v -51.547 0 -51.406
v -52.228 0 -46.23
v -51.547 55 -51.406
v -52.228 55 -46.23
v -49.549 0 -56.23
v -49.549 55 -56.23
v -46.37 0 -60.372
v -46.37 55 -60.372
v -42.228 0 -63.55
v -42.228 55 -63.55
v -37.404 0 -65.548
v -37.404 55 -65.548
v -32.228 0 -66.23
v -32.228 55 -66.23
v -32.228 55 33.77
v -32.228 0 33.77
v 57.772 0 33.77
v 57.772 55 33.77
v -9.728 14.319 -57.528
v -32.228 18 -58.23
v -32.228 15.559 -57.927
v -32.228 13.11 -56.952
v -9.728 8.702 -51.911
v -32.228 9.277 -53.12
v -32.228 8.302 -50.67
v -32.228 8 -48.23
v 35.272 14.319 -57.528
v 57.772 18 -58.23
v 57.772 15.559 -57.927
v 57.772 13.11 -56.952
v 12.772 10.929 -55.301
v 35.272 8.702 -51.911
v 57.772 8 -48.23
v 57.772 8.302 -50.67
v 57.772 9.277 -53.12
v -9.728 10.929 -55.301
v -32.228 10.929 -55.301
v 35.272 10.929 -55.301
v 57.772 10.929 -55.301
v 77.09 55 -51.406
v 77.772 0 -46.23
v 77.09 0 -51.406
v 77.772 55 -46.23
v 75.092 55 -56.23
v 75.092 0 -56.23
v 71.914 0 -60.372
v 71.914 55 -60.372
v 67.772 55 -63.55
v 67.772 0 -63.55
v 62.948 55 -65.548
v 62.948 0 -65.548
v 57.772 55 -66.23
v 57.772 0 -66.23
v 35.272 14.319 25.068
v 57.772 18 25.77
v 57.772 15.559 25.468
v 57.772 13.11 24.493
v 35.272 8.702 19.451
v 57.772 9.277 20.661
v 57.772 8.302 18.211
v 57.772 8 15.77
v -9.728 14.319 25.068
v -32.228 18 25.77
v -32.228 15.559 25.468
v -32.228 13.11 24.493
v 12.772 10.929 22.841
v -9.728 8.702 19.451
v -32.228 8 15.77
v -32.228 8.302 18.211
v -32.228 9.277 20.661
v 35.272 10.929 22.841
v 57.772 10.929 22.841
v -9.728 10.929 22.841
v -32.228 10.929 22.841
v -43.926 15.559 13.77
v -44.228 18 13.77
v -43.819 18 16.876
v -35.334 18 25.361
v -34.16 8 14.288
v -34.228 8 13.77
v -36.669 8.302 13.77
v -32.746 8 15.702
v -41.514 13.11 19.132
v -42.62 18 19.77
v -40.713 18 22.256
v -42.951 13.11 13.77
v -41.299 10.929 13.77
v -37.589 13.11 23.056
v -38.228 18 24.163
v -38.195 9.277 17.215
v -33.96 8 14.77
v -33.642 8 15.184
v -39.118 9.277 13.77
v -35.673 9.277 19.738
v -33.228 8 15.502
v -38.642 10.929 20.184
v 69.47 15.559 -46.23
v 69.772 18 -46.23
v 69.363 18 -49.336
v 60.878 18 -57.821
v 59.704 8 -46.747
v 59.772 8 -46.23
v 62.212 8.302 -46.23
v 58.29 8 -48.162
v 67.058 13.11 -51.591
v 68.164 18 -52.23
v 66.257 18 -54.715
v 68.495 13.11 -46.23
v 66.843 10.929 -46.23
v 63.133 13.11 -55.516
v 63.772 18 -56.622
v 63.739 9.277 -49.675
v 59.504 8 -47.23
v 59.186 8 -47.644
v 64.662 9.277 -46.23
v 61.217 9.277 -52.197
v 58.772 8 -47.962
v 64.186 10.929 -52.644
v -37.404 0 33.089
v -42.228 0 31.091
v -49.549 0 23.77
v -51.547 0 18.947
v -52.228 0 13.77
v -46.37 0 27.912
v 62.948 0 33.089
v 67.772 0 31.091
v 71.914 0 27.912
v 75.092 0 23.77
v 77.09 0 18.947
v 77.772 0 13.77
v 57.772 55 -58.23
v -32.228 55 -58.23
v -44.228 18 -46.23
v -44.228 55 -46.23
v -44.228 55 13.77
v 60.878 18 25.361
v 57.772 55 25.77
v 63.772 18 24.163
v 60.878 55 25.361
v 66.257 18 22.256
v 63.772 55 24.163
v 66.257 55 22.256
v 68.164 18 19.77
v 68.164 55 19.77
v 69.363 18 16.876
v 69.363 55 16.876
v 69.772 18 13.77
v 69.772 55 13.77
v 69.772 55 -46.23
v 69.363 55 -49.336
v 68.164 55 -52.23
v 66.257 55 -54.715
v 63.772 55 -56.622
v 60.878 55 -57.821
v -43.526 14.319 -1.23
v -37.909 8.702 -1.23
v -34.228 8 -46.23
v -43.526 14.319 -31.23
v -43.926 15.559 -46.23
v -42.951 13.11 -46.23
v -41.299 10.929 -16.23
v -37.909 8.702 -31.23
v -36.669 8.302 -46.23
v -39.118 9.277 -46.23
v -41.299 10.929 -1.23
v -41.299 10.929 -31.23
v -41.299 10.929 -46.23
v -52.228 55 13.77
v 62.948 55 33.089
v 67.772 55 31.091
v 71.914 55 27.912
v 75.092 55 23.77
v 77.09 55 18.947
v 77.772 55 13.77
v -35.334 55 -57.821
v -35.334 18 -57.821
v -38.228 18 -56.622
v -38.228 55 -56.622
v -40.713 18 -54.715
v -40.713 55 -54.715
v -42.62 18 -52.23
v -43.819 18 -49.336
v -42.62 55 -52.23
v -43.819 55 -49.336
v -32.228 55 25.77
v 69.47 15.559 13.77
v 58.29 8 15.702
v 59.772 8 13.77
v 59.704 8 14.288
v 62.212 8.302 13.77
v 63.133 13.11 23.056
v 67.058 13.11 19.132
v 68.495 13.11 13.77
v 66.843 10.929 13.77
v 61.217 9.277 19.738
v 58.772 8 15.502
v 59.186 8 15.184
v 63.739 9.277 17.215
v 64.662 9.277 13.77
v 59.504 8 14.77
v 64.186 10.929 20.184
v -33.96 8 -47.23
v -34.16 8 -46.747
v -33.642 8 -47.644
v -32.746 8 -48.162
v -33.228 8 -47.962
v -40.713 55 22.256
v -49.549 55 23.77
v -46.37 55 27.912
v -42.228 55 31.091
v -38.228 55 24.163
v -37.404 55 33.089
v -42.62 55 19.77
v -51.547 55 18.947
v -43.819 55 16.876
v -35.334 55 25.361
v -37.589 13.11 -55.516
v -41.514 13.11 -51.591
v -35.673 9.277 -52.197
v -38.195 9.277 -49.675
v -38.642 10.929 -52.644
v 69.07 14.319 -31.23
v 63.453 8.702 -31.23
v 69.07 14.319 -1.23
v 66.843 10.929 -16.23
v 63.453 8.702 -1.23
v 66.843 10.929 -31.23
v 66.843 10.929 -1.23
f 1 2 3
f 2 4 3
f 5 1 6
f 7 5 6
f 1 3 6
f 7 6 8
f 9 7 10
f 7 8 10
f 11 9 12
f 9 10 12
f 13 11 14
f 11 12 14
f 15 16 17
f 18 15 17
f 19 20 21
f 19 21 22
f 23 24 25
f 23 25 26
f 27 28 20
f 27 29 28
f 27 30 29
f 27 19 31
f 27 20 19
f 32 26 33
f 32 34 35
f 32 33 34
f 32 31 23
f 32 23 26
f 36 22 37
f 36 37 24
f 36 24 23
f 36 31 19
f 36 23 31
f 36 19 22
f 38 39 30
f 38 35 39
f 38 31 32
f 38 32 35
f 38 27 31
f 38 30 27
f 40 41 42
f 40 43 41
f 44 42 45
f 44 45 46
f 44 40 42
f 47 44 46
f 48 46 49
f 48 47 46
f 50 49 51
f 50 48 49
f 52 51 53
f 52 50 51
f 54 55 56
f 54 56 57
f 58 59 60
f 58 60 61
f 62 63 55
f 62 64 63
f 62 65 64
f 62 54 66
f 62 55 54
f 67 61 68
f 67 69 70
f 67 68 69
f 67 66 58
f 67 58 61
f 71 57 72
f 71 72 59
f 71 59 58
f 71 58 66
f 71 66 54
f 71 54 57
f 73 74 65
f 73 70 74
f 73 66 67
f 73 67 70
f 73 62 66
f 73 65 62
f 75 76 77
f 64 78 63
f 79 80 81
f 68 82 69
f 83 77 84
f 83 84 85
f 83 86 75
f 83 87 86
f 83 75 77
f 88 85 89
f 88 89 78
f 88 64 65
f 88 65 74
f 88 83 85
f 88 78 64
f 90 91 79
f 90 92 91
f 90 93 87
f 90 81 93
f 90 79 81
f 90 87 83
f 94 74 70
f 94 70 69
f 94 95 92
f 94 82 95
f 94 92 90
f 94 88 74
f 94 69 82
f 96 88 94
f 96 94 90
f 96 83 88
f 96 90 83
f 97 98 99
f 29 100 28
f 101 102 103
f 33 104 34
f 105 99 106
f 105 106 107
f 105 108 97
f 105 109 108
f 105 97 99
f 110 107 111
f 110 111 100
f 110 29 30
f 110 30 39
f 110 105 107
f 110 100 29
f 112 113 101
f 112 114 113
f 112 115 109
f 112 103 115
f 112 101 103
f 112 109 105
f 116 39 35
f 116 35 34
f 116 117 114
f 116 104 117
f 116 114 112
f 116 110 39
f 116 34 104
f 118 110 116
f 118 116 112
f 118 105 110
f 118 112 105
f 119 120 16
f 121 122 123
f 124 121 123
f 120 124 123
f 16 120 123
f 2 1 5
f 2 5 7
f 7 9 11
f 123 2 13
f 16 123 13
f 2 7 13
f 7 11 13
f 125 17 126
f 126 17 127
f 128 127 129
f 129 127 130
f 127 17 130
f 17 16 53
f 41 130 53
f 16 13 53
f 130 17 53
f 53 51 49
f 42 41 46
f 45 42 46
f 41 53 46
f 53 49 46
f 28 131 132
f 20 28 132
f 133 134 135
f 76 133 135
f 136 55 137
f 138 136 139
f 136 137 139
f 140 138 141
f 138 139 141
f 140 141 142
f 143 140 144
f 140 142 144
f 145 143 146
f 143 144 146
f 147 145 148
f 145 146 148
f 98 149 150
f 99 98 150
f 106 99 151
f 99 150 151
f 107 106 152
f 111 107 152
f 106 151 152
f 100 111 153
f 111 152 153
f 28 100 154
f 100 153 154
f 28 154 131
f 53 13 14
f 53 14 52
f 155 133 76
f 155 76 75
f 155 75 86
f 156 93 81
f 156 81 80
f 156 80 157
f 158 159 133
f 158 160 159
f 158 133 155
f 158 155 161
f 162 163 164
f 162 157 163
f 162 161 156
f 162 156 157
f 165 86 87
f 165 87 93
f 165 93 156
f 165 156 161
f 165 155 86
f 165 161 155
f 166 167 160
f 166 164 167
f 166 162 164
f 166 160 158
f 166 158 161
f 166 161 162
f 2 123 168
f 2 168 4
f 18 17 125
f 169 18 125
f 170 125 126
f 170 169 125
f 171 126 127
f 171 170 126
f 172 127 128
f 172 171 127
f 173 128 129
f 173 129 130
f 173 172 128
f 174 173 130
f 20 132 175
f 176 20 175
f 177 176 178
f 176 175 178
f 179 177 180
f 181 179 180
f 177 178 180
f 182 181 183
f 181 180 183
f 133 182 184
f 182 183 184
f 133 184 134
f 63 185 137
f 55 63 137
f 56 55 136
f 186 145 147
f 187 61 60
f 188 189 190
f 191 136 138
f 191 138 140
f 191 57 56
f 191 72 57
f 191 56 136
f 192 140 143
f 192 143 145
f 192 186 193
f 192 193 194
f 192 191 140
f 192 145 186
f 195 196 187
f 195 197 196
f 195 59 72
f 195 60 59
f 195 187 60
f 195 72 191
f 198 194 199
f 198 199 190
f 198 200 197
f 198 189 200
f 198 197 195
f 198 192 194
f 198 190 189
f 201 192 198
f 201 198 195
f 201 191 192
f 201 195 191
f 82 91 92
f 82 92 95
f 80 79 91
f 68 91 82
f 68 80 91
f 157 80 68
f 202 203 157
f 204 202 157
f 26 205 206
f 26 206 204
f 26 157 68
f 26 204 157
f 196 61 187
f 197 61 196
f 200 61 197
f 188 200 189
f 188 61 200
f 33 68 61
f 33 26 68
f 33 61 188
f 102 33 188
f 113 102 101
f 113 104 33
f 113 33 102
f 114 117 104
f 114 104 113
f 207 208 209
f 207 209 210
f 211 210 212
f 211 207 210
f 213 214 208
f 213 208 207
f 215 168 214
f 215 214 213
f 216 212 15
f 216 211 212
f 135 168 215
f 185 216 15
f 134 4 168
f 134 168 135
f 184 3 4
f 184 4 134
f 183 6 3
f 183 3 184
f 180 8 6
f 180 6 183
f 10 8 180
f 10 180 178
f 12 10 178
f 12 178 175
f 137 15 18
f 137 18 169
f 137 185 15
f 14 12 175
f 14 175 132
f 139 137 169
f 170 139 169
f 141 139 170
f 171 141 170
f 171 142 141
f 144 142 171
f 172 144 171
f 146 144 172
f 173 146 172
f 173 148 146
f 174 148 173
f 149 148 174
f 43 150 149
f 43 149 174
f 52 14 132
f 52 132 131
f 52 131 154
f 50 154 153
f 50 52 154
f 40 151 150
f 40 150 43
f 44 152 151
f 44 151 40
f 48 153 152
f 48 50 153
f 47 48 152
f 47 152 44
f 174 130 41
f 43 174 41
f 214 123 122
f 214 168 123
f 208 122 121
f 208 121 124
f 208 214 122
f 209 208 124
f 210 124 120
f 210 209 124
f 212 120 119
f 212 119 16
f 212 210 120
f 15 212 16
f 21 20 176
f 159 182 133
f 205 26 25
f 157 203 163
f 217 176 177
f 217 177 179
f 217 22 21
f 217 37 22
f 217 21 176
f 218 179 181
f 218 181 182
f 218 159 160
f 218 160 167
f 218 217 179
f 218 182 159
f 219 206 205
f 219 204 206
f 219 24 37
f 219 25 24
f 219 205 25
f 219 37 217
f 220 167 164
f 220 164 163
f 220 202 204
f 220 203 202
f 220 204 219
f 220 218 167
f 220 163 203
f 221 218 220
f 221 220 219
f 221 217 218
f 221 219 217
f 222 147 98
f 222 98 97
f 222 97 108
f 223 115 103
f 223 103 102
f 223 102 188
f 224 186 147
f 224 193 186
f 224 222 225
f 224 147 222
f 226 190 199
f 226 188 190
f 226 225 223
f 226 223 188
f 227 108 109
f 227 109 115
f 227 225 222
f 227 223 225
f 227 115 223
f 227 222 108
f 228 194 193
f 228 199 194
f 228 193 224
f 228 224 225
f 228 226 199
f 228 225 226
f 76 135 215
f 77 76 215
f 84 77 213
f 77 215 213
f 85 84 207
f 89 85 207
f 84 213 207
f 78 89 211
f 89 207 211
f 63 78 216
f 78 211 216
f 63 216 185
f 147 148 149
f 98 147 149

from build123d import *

# Parameters (mm, degrees)
ESQUISSE4_W             = 130
ESQUISSE4_H             = 100
BOSS_EXTRU_4_DEPTH      = 55
CONG_5_R                = 20
ENL_V_MAT_EXTRU_1_DEPTH = 47
CONG_6_SIZE             = 10


with BuildPart() as part:
    # Esquisse4 → Boss.-Extru.4 (new body)
    with BuildSketch(Plane(origin=(0, 0, 0), x_dir=(1, 0, 0), z_dir=(0, 1, 0))):
        with Locations((12.771948074, 16.229726537)):
            Rectangle(ESQUISSE4_W, ESQUISSE4_H)
    extrude(amount=BOSS_EXTRU_4_DEPTH)

    # Congé5
    cong_5_edges = [part.edges().sort_by_distance(p)[0] for p in [
        (-52.228051926, 27.5, -66.229726537),
        (77.771948074, 27.5, -66.229726537),
        (77.771948074, 27.5, 33.770273463),
        (-52.228051926, 27.5, 33.770273463),
    ]]
    fillet(cong_5_edges, radius=CONG_5_R)

    # Esquisse5 → Enlèv. mat.-Extru.1 (cut)
    with BuildSketch(Plane(origin=(0, 55, 0), x_dir=(1, 0, 0), z_dir=(0, 1, 0))):
        with BuildLine():
            Line((57.771948074, 58.229726537), (-32.228051926, 58.229726537))
            ThreePointArc((-32.228051926, 58.229726537), (-40.713333301, 54.715007912), (-44.228051926, 46.229726537))
            Line((-44.228051926, 46.229726537), (-44.228051926, -13.770273463))
            ThreePointArc((-44.228051926, -13.770273463), (-40.713333301, -22.255554837), (-32.228051926, -25.770273463))
            Line((-32.228051926, -25.770273463), (57.771948074, -25.770273463))
            ThreePointArc((57.771948074, -25.770273463), (66.257229448, -22.255554837), (69.771948074, -13.770273463))
            Line((69.771948074, -13.770273463), (69.771948074, 46.229726537))
            ThreePointArc((69.771948074, 46.229726537), (66.257229448, 54.715007912), (57.771948074, 58.229726537))
        make_face()
    extrude(amount=-ENL_V_MAT_EXTRU_1_DEPTH, mode=Mode.SUBTRACT)

    # Congé6
    # a fillet whose section is not a circle: 10 mm, written as the material it adds along each edge
    with BuildSketch(Plane(origin=(57.771948074, 8, -46.229726537), x_dir=(1, 0, 0), z_dir=(0, 0, 1))) as cong_6_piece_1:
        with BuildLine():
            Bezier((12, CONG_6_SIZE), (12, 0), (12 - CONG_6_SIZE, 0), weights=[1, 0.707106781, 1])
            Line((12 - CONG_6_SIZE, 0), (12, 0))
            Line((12, 0), (12, CONG_6_SIZE))
        make_face()
    revolve(axis=Axis((57.771948074, 8, -46.229726537), (0, 1, 0)), revolution_arc=90)
    with BuildSketch(Plane(origin=(69.771948074, 8, 13.770273463), x_dir=(0, 1, 0), z_dir=(0, 0, -1)), Plane(origin=(-44.228051926, 8, -46.229726537), x_dir=(0, 1, 0), z_dir=(0, 0, 1))) as cong_6_piece_2:
        with BuildLine():
            Bezier((CONG_6_SIZE, 0), (0, 0), (0, -CONG_6_SIZE), weights=[1, 0.707106781, 1])
            Line((0, -CONG_6_SIZE), (0, 0))
            Line((0, 0), (CONG_6_SIZE, 0))
        make_face()
    extrude(amount=60)
    with BuildSketch(Plane(origin=(57.771948074, 8, 13.770273463), x_dir=(0, 0, 1), z_dir=(-1, 0, 0))) as cong_6_piece_3:
        with BuildLine():
            Bezier((12, CONG_6_SIZE), (12, 0), (12 - CONG_6_SIZE, 0), weights=[1, 0.707106781, 1])
            Line((12 - CONG_6_SIZE, 0), (12, 0))
            Line((12, 0), (12, CONG_6_SIZE))
        make_face()
    revolve(axis=Axis((57.771948074, 8, 13.770273463), (0, 1, 0)), revolution_arc=90)
    with BuildSketch(Plane(origin=(-32.228051926, 8, 25.770273463), x_dir=(0, 1, 0), z_dir=(1, 0, 0)), Plane(origin=(57.771948074, 8, -58.229726537), x_dir=(0, 1, 0), z_dir=(-1, 0, 0))) as cong_6_piece_4:
        with BuildLine():
            Bezier((CONG_6_SIZE, 0), (0, 0), (0, -CONG_6_SIZE), weights=[1, 0.707106781, 1])
            Line((0, -CONG_6_SIZE), (0, 0))
            Line((0, 0), (CONG_6_SIZE, 0))
        make_face()
    extrude(amount=90)
    with BuildSketch(Plane(origin=(-32.228051926, 8, 13.770273463), x_dir=(-1, 0, 0), z_dir=(0, 0, -1))) as cong_6_piece_5:
        with BuildLine():
            Bezier((12, CONG_6_SIZE), (12, 0), (12 - CONG_6_SIZE, 0), weights=[1, 0.707106781, 1])
            Line((12 - CONG_6_SIZE, 0), (12, 0))
            Line((12, 0), (12, CONG_6_SIZE))
        make_face()
    revolve(axis=Axis((-32.228051926, 8, 13.770273463), (0, 1, 0)), revolution_arc=90)
    with BuildSketch(Plane(origin=(-32.228051926, 8, -46.229726537), x_dir=(0, 0, -1), z_dir=(1, 0, 0))) as cong_6_piece_6:
        with BuildLine():
            Bezier((12, CONG_6_SIZE), (12, 0), (12 - CONG_6_SIZE, 0), weights=[1, 0.707106781, 1])
            Line((12 - CONG_6_SIZE, 0), (12, 0))
            Line((12, 0), (12, CONG_6_SIZE))
        make_face()
    revolve(axis=Axis((-32.228051926, 8, -46.229726537), (0, 1, 0)), revolution_arc=90)


solid = part.part
